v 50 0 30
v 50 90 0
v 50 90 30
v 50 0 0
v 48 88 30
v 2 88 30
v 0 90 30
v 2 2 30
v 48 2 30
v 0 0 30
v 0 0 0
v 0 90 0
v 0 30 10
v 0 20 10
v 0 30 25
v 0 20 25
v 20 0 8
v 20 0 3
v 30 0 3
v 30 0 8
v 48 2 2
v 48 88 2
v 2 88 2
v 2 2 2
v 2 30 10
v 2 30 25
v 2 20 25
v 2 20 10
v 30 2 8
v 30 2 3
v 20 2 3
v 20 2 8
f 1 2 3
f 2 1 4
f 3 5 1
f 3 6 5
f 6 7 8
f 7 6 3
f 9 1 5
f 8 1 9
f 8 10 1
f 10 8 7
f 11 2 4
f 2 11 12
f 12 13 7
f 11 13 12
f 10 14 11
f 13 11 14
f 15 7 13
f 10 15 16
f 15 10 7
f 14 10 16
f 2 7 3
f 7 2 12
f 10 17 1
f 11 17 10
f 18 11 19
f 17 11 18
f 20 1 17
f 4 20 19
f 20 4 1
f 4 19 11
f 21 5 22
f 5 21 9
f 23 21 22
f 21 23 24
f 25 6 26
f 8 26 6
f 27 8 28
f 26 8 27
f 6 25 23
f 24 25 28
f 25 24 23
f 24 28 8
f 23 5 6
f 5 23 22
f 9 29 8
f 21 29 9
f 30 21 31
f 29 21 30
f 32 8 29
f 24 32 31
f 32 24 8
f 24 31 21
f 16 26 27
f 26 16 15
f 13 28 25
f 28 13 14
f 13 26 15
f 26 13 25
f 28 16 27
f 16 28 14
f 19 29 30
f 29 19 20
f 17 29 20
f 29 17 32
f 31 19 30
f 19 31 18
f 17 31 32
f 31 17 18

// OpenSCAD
// Parametryczna Obudowa 3D
// Miejsce na ESP32, ogniwo 18650 i moduł TP4056

wall = 2;
x_width = 50;
y_length = 90;
z_height = 30;

module case_body() {
    difference() {
        // Główna bryła
        cube([x_width, y_length, z_height]);
        
        // Wnętrze (wydrążenie)
        translate([wall, wall, wall])
            cube([x_width - 2*wall, y_length - 2*wall, z_height]);
            
        // Otwór na przełącznik (10x15mm kołyskowy) na bocznej ściance
        translate([-1, 20, 10])
            cube([5, 10, 15]);
            
        // Otwór na port USB z TP4056
        translate([x_width/2 - 5, -1, 3])
            cube([10, 5, 5]);
            
        // Otwór na ekran SSD1306/TFT
translate([10, 10, z_height-2]) cube([27, 27, 5]);
    }
}

case_body();
